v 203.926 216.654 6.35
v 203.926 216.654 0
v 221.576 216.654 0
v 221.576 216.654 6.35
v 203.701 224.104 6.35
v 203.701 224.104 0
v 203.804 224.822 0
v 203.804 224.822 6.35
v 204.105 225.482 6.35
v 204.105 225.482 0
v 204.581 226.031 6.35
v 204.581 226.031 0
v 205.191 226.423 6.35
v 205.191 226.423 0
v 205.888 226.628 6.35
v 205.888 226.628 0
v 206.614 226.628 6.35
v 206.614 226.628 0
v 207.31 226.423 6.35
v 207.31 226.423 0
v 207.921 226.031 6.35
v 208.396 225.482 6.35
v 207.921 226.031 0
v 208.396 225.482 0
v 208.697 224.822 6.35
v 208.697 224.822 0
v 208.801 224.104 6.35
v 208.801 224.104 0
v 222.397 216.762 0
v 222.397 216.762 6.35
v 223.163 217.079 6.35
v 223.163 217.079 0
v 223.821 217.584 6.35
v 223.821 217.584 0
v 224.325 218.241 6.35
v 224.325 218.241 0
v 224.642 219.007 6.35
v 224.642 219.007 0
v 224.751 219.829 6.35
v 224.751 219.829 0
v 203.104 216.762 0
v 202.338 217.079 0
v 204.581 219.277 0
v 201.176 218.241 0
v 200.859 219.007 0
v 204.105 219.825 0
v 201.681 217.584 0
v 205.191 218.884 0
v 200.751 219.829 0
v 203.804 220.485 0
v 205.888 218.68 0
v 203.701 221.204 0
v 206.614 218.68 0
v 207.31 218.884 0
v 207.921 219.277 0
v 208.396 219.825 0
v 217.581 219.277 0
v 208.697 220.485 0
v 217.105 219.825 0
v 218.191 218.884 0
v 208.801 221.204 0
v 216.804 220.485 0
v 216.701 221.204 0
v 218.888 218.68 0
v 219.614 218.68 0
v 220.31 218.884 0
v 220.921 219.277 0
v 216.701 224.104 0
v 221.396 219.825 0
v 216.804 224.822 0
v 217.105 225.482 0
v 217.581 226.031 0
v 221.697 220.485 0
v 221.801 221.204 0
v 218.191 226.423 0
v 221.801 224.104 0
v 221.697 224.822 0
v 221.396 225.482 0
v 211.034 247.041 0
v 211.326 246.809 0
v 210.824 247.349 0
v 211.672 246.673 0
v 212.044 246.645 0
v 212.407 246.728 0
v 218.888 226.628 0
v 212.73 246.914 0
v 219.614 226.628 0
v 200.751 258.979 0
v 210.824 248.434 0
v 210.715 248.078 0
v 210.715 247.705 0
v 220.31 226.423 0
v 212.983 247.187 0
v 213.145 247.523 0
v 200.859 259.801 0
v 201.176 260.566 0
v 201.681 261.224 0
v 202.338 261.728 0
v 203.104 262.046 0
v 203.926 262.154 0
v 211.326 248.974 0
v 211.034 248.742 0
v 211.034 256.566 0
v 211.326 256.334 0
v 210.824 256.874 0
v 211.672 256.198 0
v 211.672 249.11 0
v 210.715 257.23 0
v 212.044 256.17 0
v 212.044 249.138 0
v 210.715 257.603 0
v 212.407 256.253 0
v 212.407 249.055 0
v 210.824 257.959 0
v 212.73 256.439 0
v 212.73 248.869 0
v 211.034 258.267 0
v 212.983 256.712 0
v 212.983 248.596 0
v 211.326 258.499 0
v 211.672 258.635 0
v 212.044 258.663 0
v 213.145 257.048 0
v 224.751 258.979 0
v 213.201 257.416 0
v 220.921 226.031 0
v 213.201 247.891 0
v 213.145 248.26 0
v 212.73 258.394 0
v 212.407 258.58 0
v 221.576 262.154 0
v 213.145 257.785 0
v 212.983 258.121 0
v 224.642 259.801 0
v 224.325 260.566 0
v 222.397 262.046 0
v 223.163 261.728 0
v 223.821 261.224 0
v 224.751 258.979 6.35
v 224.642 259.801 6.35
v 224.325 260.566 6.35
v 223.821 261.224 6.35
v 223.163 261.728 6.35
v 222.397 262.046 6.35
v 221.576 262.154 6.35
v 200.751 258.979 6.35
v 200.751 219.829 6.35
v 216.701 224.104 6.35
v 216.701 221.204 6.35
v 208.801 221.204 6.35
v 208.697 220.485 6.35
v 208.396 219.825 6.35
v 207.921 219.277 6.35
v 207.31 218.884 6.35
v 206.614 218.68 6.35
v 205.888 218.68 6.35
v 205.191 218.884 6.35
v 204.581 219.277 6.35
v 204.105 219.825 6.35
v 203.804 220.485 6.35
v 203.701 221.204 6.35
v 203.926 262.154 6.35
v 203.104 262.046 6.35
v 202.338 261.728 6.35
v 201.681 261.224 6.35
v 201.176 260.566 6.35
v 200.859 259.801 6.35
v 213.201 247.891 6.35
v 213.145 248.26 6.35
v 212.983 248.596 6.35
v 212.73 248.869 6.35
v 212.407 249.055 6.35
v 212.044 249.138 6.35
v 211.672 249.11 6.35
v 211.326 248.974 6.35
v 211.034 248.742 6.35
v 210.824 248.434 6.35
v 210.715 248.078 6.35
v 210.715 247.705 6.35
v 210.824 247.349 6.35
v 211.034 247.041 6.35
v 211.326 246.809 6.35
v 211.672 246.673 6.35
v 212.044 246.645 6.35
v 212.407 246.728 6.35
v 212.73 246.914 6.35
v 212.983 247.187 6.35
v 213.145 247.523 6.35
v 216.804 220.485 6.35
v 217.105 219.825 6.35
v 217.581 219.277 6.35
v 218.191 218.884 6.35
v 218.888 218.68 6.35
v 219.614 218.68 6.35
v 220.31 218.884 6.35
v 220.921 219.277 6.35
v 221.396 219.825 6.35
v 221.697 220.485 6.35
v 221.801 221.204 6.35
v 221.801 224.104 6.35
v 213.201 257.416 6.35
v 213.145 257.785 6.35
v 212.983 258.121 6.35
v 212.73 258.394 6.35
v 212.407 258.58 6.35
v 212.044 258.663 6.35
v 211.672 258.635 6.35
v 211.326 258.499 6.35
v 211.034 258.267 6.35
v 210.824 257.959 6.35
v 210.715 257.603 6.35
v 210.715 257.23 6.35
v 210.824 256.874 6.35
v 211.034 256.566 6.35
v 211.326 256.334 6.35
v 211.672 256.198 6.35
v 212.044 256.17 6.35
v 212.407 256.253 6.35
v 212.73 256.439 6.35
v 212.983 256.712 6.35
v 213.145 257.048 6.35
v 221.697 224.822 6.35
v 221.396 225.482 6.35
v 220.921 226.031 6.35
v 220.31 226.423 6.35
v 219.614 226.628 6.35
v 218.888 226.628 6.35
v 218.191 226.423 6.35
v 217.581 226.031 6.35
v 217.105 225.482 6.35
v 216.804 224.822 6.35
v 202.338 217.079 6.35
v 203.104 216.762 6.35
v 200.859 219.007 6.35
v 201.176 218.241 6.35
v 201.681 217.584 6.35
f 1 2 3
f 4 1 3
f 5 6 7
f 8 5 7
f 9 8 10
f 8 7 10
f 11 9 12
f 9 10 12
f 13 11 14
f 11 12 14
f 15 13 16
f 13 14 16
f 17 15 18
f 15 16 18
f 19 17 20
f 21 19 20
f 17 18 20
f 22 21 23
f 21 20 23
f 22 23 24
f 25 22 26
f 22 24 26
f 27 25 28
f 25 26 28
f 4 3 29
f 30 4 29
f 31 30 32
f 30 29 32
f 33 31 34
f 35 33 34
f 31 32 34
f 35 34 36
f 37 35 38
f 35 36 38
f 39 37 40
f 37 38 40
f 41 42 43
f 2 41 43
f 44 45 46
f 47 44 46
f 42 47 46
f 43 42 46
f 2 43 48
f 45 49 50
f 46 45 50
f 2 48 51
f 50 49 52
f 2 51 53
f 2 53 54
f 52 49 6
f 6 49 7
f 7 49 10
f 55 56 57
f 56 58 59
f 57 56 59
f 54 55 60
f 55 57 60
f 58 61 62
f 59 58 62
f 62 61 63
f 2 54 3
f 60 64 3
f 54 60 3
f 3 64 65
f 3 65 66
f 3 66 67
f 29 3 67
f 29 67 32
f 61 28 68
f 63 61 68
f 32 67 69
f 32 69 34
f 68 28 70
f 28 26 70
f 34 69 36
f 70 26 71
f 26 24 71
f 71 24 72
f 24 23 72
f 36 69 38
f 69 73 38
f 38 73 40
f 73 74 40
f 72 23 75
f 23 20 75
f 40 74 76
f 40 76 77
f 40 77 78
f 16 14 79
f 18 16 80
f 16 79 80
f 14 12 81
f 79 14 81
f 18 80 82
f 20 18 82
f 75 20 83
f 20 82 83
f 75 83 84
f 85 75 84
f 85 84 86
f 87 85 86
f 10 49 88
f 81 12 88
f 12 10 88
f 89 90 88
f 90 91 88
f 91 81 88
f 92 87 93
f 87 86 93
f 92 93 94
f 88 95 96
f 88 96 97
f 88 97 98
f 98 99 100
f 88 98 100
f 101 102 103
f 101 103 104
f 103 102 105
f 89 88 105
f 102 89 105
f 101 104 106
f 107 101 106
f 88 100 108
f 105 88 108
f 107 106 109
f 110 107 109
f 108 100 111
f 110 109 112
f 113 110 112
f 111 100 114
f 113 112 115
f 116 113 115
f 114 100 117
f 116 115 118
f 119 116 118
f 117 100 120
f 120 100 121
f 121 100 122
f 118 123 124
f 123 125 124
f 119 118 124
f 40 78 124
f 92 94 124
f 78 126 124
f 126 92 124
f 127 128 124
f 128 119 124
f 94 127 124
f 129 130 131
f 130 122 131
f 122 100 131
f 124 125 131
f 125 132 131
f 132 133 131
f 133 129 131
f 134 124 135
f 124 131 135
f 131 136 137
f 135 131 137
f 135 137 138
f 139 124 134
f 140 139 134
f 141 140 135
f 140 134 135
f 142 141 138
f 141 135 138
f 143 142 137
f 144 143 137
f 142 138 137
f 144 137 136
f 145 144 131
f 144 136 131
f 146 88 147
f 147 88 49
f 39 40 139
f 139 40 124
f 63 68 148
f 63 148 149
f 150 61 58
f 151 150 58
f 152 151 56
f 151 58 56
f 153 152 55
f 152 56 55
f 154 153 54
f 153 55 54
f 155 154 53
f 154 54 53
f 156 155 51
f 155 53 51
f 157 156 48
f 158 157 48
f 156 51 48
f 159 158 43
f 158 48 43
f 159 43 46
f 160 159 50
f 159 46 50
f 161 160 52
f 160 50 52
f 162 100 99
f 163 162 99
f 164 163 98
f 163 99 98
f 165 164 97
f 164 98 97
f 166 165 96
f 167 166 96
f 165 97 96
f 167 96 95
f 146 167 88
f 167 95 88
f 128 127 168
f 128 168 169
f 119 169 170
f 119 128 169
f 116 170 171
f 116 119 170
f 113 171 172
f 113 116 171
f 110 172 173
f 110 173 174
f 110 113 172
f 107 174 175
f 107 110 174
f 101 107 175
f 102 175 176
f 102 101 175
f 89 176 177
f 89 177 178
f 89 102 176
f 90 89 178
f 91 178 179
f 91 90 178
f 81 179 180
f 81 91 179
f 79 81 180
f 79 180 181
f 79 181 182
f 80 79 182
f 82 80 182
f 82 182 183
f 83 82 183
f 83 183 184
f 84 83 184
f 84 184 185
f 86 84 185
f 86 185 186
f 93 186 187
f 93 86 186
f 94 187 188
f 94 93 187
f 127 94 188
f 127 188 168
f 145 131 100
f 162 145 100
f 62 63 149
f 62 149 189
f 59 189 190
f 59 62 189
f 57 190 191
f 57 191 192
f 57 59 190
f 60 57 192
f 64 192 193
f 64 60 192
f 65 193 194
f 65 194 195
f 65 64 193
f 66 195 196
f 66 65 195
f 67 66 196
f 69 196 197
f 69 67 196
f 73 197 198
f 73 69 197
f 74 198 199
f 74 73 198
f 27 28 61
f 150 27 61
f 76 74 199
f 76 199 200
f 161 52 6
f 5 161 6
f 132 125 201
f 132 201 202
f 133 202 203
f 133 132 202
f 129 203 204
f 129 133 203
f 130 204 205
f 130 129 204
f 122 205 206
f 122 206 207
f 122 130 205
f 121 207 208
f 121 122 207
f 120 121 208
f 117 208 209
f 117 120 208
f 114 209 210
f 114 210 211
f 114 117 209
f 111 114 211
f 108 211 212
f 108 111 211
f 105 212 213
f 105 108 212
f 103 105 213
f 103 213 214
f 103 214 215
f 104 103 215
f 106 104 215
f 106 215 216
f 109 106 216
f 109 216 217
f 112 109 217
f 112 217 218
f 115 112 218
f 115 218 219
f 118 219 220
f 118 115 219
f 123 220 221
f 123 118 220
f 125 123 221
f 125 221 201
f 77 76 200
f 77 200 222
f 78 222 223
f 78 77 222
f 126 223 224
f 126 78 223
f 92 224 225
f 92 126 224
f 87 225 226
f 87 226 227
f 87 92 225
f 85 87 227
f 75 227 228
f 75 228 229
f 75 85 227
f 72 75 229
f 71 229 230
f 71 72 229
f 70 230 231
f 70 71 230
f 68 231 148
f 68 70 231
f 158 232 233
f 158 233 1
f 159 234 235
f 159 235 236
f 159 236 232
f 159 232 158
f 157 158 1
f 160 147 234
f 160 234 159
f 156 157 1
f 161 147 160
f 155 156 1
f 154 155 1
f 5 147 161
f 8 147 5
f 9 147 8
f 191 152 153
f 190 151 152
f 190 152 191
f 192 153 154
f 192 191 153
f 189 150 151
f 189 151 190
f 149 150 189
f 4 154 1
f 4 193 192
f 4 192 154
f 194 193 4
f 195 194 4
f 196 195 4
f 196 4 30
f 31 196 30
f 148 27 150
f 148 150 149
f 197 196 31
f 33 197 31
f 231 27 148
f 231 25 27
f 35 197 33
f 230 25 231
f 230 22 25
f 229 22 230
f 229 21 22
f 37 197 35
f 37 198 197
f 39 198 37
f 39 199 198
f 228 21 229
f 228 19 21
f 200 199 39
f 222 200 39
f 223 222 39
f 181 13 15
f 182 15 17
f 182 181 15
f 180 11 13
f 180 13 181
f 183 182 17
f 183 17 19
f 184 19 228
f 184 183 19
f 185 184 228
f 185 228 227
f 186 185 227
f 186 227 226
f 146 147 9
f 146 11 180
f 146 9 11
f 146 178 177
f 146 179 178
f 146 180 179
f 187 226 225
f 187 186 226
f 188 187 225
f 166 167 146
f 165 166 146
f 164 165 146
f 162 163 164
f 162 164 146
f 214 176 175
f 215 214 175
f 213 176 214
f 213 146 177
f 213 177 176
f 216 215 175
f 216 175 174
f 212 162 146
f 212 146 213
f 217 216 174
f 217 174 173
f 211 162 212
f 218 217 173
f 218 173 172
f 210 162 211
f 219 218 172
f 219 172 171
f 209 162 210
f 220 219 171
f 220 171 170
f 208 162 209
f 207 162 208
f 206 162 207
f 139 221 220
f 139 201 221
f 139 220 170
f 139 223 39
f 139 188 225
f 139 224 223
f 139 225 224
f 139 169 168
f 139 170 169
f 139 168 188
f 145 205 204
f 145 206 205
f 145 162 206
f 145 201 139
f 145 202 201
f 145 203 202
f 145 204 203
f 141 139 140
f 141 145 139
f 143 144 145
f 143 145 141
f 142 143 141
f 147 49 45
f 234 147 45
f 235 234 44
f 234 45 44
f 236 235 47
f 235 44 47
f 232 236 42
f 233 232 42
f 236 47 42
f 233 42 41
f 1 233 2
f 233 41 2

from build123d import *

# Parameters (mm, degrees)
SKETCH1_R           = 1.249999999
BOSS_EXTRUDE1_DEPTH = 6.35


with BuildPart() as part:
    # Sketch1 → Boss-Extrude1 (new body)
    with BuildSketch(Plane.XY):
        with BuildLine():
            Line((200.750613804, 258.978854223), (200.750613804, 219.828854223))
            ThreePointArc((200.750613804, 219.828854223), (201.680549774, 217.583790192), (203.925613804, 216.653854223))
            Line((203.925613804, 216.653854223), (221.575613802, 216.653854223))
            ThreePointArc((221.575613802, 216.653854223), (223.820677833, 217.583790192), (224.750613802, 219.828854223))
            Line((224.750613802, 219.828854223), (224.750613802, 258.978854223))
            ThreePointArc((224.750613802, 258.978854223), (223.820677833, 261.223918253), (221.575613802, 262.153854223))
            Line((221.575613802, 262.153854223), (203.925613804, 262.153854223))
            ThreePointArc((203.925613804, 262.153854223), (201.680549774, 261.223918253), (200.750613804, 258.978854223))
        make_face()
        with Locations((211.950613802, 247.891354224)):
            Circle(SKETCH1_R, mode=Mode.SUBTRACT)
        with Locations((211.950613802, 257.416354224)):
            Circle(SKETCH1_R, mode=Mode.SUBTRACT)
        with BuildLine():
            Line((203.700613802, 221.203854223), (203.700613802, 224.103854225))
            ThreePointArc((203.700613802, 224.103854225), (206.250613802, 226.653854225), (208.800613803, 224.103854225))
            Line((208.800613803, 224.103854225), (208.800613803, 221.203854223))
            ThreePointArc((208.800613803, 221.203854223), (206.250613802, 218.653854223), (203.700613802, 221.203854223))
        make_face(mode=Mode.SUBTRACT)
        with BuildLine():
            Line((216.700613804, 224.103854225), (216.700613804, 221.203854223))
            ThreePointArc((216.700613804, 221.203854223), (219.250613803, 218.653854224), (221.800613802, 221.203854223))
            Line((221.800613802, 221.203854223), (221.800613802, 224.103854225))
            ThreePointArc((221.800613802, 224.103854225), (219.250613803, 226.653854224), (216.700613804, 224.103854225))
        make_face(mode=Mode.SUBTRACT)
    extrude(amount=BOSS_EXTRUDE1_DEPTH)


solid = part.part
